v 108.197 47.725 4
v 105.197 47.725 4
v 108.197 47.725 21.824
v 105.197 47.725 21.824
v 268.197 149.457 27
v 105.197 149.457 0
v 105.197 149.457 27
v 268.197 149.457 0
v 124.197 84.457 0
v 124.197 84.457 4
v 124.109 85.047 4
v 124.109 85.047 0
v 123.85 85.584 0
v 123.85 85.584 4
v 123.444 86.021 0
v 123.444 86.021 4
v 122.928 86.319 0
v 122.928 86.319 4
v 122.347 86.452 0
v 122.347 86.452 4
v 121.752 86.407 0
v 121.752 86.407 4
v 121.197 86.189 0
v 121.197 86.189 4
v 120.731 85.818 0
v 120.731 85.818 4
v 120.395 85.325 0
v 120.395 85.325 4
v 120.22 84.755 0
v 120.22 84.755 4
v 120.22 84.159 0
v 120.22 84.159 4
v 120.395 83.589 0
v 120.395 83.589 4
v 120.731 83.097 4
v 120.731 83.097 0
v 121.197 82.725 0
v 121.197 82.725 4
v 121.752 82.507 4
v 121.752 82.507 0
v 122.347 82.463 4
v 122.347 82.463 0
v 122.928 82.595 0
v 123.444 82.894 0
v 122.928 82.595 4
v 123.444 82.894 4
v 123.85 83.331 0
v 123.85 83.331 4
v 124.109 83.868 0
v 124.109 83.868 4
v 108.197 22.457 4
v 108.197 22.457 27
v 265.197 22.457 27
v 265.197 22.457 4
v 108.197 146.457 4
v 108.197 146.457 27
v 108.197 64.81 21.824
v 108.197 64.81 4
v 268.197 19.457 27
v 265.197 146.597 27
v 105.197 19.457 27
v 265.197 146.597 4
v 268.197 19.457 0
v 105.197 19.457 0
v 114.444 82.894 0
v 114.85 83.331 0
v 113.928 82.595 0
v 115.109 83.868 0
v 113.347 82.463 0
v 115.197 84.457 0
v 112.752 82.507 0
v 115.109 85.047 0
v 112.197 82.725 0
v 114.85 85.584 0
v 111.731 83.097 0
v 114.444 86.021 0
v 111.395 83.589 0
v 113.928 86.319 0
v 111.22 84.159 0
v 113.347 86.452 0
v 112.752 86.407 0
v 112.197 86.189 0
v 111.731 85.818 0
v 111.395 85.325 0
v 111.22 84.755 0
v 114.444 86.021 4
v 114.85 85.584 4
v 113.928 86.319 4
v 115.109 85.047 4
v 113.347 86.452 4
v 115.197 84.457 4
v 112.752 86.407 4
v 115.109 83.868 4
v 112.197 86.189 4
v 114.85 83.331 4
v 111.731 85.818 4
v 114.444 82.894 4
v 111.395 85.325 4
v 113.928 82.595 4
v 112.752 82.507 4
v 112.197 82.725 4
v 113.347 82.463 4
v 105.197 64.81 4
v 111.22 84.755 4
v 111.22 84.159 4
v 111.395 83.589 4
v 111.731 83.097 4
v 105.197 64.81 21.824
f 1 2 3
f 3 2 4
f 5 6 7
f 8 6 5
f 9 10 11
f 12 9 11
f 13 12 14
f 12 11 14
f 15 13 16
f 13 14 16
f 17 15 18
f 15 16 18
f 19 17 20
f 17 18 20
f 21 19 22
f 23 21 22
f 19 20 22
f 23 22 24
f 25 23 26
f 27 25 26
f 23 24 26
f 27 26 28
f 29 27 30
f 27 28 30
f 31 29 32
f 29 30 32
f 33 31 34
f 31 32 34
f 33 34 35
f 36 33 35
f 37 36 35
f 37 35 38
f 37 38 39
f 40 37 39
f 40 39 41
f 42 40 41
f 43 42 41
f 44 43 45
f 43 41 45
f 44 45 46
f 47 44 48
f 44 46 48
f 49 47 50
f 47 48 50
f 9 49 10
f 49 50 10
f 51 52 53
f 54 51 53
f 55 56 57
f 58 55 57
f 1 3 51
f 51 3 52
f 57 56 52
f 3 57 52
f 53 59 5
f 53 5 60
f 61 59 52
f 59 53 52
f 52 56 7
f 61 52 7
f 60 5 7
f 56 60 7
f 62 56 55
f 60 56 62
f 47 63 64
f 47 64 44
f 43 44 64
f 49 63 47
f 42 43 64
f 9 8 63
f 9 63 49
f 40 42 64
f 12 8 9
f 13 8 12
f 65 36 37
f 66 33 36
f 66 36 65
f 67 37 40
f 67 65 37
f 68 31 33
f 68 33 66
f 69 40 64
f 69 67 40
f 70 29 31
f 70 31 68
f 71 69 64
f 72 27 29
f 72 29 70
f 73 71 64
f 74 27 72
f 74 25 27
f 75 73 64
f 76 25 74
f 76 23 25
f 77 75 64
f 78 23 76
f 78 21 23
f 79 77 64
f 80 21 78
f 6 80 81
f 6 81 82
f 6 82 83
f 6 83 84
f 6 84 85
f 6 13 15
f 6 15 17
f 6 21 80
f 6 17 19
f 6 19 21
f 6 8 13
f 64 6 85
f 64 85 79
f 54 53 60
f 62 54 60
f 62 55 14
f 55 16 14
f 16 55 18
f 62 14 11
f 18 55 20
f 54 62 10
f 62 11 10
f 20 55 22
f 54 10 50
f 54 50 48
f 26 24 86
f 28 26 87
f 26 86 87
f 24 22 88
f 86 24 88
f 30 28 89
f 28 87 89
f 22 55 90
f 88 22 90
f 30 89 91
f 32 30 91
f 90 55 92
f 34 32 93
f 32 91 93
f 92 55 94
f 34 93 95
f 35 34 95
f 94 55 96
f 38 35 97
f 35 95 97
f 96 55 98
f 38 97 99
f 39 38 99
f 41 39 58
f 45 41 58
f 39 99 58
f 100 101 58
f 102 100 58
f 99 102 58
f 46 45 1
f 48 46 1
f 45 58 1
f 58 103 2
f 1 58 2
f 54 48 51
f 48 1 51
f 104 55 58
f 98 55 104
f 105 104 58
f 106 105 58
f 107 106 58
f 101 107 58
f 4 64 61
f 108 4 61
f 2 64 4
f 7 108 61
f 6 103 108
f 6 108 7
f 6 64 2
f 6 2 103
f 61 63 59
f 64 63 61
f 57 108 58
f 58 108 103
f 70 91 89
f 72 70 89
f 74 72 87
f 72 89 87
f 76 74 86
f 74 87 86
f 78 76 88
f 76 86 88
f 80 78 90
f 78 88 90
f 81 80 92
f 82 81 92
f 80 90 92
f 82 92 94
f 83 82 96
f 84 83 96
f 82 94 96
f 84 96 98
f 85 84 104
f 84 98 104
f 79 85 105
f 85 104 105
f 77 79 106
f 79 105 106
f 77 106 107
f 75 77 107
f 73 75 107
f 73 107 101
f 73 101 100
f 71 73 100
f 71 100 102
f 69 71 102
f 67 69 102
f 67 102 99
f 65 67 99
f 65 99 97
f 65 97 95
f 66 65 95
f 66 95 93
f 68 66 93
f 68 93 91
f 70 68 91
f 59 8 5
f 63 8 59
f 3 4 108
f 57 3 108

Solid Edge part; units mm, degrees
sketch "Sketch1" plane through (0, 0, 0) normal (0, 0, 1) x (1, 0, 0)
  line L0 (105.1974, 149.4572) -> (268.1974, 149.4572)
  line L1 (268.1974, 149.4572) -> (268.1974, 19.4572)
  line L2 (268.1974, 19.4572) -> (105.1974, 19.4572)
  line L3 (105.1974, 19.4572) -> (105.1974, 149.4572)
  dimension "D1" = 163
  dimension "D2" = 130
extrude "Protrusion1" add sketch "Sketch1" along normal blind 27
sketch "Sketch2" plane through (170.1974, 84.4572, 27) normal (0, 0, 1) x (1, 0, 0)
  line L0 (-62, 62) -> (-62, -62)
  line L1 (-62, -62) -> (95, -62)
  line L2 (95, -62) -> (95, 62.14)
  line L3 (-62, 62) -> (95, 62.14)
  dimension "D1" = 3
  dimension "D2" = 3
  dimension "D3" = 3
  dimension "D4" = 3
  dimension "D5" = 3
extrude "ExtrudedCutout_1" cut sketch "Sketch2" against normal blind 23
sketch "Sketch3" plane through (170.1974, 84.5136, 4) normal (0, 0, 1) x (1, 0, 0)
  circle A0 centre (-57, -0.0564) radius 2
  circle A1 centre (-48, -0.0564) radius 2
  dimension "D1" = 4
  dimension "D2" = 5
  dimension "D3" = 4
  dimension "D4" = 9
extrude "Cutout1" cut sketch "Sketch3" against normal through all
extrude "Cutout2" [suppressed]
extrude "ExtrudedCutout_4" [suppressed]
sketch "Sketch4" plane through (105.1974, 84.4572, 12) normal (-1, 0, 0) x (0, -1, 0)
  line L0 (19.6475, 9.8237) -> (19.6475, -8)
  line L1 (19.6475, -8) -> (36.7322, -8)
  line L2 (36.7322, -8) -> (36.7322, 9.8237)
  line L3 (36.7322, 9.8237) -> (19.6475, 9.8237)
extrude "Cutout3" cut sketch "Sketch4" against normal up to next
extrude "Cutout4" [suppressed]
extrude "Cutout5" [suppressed]
